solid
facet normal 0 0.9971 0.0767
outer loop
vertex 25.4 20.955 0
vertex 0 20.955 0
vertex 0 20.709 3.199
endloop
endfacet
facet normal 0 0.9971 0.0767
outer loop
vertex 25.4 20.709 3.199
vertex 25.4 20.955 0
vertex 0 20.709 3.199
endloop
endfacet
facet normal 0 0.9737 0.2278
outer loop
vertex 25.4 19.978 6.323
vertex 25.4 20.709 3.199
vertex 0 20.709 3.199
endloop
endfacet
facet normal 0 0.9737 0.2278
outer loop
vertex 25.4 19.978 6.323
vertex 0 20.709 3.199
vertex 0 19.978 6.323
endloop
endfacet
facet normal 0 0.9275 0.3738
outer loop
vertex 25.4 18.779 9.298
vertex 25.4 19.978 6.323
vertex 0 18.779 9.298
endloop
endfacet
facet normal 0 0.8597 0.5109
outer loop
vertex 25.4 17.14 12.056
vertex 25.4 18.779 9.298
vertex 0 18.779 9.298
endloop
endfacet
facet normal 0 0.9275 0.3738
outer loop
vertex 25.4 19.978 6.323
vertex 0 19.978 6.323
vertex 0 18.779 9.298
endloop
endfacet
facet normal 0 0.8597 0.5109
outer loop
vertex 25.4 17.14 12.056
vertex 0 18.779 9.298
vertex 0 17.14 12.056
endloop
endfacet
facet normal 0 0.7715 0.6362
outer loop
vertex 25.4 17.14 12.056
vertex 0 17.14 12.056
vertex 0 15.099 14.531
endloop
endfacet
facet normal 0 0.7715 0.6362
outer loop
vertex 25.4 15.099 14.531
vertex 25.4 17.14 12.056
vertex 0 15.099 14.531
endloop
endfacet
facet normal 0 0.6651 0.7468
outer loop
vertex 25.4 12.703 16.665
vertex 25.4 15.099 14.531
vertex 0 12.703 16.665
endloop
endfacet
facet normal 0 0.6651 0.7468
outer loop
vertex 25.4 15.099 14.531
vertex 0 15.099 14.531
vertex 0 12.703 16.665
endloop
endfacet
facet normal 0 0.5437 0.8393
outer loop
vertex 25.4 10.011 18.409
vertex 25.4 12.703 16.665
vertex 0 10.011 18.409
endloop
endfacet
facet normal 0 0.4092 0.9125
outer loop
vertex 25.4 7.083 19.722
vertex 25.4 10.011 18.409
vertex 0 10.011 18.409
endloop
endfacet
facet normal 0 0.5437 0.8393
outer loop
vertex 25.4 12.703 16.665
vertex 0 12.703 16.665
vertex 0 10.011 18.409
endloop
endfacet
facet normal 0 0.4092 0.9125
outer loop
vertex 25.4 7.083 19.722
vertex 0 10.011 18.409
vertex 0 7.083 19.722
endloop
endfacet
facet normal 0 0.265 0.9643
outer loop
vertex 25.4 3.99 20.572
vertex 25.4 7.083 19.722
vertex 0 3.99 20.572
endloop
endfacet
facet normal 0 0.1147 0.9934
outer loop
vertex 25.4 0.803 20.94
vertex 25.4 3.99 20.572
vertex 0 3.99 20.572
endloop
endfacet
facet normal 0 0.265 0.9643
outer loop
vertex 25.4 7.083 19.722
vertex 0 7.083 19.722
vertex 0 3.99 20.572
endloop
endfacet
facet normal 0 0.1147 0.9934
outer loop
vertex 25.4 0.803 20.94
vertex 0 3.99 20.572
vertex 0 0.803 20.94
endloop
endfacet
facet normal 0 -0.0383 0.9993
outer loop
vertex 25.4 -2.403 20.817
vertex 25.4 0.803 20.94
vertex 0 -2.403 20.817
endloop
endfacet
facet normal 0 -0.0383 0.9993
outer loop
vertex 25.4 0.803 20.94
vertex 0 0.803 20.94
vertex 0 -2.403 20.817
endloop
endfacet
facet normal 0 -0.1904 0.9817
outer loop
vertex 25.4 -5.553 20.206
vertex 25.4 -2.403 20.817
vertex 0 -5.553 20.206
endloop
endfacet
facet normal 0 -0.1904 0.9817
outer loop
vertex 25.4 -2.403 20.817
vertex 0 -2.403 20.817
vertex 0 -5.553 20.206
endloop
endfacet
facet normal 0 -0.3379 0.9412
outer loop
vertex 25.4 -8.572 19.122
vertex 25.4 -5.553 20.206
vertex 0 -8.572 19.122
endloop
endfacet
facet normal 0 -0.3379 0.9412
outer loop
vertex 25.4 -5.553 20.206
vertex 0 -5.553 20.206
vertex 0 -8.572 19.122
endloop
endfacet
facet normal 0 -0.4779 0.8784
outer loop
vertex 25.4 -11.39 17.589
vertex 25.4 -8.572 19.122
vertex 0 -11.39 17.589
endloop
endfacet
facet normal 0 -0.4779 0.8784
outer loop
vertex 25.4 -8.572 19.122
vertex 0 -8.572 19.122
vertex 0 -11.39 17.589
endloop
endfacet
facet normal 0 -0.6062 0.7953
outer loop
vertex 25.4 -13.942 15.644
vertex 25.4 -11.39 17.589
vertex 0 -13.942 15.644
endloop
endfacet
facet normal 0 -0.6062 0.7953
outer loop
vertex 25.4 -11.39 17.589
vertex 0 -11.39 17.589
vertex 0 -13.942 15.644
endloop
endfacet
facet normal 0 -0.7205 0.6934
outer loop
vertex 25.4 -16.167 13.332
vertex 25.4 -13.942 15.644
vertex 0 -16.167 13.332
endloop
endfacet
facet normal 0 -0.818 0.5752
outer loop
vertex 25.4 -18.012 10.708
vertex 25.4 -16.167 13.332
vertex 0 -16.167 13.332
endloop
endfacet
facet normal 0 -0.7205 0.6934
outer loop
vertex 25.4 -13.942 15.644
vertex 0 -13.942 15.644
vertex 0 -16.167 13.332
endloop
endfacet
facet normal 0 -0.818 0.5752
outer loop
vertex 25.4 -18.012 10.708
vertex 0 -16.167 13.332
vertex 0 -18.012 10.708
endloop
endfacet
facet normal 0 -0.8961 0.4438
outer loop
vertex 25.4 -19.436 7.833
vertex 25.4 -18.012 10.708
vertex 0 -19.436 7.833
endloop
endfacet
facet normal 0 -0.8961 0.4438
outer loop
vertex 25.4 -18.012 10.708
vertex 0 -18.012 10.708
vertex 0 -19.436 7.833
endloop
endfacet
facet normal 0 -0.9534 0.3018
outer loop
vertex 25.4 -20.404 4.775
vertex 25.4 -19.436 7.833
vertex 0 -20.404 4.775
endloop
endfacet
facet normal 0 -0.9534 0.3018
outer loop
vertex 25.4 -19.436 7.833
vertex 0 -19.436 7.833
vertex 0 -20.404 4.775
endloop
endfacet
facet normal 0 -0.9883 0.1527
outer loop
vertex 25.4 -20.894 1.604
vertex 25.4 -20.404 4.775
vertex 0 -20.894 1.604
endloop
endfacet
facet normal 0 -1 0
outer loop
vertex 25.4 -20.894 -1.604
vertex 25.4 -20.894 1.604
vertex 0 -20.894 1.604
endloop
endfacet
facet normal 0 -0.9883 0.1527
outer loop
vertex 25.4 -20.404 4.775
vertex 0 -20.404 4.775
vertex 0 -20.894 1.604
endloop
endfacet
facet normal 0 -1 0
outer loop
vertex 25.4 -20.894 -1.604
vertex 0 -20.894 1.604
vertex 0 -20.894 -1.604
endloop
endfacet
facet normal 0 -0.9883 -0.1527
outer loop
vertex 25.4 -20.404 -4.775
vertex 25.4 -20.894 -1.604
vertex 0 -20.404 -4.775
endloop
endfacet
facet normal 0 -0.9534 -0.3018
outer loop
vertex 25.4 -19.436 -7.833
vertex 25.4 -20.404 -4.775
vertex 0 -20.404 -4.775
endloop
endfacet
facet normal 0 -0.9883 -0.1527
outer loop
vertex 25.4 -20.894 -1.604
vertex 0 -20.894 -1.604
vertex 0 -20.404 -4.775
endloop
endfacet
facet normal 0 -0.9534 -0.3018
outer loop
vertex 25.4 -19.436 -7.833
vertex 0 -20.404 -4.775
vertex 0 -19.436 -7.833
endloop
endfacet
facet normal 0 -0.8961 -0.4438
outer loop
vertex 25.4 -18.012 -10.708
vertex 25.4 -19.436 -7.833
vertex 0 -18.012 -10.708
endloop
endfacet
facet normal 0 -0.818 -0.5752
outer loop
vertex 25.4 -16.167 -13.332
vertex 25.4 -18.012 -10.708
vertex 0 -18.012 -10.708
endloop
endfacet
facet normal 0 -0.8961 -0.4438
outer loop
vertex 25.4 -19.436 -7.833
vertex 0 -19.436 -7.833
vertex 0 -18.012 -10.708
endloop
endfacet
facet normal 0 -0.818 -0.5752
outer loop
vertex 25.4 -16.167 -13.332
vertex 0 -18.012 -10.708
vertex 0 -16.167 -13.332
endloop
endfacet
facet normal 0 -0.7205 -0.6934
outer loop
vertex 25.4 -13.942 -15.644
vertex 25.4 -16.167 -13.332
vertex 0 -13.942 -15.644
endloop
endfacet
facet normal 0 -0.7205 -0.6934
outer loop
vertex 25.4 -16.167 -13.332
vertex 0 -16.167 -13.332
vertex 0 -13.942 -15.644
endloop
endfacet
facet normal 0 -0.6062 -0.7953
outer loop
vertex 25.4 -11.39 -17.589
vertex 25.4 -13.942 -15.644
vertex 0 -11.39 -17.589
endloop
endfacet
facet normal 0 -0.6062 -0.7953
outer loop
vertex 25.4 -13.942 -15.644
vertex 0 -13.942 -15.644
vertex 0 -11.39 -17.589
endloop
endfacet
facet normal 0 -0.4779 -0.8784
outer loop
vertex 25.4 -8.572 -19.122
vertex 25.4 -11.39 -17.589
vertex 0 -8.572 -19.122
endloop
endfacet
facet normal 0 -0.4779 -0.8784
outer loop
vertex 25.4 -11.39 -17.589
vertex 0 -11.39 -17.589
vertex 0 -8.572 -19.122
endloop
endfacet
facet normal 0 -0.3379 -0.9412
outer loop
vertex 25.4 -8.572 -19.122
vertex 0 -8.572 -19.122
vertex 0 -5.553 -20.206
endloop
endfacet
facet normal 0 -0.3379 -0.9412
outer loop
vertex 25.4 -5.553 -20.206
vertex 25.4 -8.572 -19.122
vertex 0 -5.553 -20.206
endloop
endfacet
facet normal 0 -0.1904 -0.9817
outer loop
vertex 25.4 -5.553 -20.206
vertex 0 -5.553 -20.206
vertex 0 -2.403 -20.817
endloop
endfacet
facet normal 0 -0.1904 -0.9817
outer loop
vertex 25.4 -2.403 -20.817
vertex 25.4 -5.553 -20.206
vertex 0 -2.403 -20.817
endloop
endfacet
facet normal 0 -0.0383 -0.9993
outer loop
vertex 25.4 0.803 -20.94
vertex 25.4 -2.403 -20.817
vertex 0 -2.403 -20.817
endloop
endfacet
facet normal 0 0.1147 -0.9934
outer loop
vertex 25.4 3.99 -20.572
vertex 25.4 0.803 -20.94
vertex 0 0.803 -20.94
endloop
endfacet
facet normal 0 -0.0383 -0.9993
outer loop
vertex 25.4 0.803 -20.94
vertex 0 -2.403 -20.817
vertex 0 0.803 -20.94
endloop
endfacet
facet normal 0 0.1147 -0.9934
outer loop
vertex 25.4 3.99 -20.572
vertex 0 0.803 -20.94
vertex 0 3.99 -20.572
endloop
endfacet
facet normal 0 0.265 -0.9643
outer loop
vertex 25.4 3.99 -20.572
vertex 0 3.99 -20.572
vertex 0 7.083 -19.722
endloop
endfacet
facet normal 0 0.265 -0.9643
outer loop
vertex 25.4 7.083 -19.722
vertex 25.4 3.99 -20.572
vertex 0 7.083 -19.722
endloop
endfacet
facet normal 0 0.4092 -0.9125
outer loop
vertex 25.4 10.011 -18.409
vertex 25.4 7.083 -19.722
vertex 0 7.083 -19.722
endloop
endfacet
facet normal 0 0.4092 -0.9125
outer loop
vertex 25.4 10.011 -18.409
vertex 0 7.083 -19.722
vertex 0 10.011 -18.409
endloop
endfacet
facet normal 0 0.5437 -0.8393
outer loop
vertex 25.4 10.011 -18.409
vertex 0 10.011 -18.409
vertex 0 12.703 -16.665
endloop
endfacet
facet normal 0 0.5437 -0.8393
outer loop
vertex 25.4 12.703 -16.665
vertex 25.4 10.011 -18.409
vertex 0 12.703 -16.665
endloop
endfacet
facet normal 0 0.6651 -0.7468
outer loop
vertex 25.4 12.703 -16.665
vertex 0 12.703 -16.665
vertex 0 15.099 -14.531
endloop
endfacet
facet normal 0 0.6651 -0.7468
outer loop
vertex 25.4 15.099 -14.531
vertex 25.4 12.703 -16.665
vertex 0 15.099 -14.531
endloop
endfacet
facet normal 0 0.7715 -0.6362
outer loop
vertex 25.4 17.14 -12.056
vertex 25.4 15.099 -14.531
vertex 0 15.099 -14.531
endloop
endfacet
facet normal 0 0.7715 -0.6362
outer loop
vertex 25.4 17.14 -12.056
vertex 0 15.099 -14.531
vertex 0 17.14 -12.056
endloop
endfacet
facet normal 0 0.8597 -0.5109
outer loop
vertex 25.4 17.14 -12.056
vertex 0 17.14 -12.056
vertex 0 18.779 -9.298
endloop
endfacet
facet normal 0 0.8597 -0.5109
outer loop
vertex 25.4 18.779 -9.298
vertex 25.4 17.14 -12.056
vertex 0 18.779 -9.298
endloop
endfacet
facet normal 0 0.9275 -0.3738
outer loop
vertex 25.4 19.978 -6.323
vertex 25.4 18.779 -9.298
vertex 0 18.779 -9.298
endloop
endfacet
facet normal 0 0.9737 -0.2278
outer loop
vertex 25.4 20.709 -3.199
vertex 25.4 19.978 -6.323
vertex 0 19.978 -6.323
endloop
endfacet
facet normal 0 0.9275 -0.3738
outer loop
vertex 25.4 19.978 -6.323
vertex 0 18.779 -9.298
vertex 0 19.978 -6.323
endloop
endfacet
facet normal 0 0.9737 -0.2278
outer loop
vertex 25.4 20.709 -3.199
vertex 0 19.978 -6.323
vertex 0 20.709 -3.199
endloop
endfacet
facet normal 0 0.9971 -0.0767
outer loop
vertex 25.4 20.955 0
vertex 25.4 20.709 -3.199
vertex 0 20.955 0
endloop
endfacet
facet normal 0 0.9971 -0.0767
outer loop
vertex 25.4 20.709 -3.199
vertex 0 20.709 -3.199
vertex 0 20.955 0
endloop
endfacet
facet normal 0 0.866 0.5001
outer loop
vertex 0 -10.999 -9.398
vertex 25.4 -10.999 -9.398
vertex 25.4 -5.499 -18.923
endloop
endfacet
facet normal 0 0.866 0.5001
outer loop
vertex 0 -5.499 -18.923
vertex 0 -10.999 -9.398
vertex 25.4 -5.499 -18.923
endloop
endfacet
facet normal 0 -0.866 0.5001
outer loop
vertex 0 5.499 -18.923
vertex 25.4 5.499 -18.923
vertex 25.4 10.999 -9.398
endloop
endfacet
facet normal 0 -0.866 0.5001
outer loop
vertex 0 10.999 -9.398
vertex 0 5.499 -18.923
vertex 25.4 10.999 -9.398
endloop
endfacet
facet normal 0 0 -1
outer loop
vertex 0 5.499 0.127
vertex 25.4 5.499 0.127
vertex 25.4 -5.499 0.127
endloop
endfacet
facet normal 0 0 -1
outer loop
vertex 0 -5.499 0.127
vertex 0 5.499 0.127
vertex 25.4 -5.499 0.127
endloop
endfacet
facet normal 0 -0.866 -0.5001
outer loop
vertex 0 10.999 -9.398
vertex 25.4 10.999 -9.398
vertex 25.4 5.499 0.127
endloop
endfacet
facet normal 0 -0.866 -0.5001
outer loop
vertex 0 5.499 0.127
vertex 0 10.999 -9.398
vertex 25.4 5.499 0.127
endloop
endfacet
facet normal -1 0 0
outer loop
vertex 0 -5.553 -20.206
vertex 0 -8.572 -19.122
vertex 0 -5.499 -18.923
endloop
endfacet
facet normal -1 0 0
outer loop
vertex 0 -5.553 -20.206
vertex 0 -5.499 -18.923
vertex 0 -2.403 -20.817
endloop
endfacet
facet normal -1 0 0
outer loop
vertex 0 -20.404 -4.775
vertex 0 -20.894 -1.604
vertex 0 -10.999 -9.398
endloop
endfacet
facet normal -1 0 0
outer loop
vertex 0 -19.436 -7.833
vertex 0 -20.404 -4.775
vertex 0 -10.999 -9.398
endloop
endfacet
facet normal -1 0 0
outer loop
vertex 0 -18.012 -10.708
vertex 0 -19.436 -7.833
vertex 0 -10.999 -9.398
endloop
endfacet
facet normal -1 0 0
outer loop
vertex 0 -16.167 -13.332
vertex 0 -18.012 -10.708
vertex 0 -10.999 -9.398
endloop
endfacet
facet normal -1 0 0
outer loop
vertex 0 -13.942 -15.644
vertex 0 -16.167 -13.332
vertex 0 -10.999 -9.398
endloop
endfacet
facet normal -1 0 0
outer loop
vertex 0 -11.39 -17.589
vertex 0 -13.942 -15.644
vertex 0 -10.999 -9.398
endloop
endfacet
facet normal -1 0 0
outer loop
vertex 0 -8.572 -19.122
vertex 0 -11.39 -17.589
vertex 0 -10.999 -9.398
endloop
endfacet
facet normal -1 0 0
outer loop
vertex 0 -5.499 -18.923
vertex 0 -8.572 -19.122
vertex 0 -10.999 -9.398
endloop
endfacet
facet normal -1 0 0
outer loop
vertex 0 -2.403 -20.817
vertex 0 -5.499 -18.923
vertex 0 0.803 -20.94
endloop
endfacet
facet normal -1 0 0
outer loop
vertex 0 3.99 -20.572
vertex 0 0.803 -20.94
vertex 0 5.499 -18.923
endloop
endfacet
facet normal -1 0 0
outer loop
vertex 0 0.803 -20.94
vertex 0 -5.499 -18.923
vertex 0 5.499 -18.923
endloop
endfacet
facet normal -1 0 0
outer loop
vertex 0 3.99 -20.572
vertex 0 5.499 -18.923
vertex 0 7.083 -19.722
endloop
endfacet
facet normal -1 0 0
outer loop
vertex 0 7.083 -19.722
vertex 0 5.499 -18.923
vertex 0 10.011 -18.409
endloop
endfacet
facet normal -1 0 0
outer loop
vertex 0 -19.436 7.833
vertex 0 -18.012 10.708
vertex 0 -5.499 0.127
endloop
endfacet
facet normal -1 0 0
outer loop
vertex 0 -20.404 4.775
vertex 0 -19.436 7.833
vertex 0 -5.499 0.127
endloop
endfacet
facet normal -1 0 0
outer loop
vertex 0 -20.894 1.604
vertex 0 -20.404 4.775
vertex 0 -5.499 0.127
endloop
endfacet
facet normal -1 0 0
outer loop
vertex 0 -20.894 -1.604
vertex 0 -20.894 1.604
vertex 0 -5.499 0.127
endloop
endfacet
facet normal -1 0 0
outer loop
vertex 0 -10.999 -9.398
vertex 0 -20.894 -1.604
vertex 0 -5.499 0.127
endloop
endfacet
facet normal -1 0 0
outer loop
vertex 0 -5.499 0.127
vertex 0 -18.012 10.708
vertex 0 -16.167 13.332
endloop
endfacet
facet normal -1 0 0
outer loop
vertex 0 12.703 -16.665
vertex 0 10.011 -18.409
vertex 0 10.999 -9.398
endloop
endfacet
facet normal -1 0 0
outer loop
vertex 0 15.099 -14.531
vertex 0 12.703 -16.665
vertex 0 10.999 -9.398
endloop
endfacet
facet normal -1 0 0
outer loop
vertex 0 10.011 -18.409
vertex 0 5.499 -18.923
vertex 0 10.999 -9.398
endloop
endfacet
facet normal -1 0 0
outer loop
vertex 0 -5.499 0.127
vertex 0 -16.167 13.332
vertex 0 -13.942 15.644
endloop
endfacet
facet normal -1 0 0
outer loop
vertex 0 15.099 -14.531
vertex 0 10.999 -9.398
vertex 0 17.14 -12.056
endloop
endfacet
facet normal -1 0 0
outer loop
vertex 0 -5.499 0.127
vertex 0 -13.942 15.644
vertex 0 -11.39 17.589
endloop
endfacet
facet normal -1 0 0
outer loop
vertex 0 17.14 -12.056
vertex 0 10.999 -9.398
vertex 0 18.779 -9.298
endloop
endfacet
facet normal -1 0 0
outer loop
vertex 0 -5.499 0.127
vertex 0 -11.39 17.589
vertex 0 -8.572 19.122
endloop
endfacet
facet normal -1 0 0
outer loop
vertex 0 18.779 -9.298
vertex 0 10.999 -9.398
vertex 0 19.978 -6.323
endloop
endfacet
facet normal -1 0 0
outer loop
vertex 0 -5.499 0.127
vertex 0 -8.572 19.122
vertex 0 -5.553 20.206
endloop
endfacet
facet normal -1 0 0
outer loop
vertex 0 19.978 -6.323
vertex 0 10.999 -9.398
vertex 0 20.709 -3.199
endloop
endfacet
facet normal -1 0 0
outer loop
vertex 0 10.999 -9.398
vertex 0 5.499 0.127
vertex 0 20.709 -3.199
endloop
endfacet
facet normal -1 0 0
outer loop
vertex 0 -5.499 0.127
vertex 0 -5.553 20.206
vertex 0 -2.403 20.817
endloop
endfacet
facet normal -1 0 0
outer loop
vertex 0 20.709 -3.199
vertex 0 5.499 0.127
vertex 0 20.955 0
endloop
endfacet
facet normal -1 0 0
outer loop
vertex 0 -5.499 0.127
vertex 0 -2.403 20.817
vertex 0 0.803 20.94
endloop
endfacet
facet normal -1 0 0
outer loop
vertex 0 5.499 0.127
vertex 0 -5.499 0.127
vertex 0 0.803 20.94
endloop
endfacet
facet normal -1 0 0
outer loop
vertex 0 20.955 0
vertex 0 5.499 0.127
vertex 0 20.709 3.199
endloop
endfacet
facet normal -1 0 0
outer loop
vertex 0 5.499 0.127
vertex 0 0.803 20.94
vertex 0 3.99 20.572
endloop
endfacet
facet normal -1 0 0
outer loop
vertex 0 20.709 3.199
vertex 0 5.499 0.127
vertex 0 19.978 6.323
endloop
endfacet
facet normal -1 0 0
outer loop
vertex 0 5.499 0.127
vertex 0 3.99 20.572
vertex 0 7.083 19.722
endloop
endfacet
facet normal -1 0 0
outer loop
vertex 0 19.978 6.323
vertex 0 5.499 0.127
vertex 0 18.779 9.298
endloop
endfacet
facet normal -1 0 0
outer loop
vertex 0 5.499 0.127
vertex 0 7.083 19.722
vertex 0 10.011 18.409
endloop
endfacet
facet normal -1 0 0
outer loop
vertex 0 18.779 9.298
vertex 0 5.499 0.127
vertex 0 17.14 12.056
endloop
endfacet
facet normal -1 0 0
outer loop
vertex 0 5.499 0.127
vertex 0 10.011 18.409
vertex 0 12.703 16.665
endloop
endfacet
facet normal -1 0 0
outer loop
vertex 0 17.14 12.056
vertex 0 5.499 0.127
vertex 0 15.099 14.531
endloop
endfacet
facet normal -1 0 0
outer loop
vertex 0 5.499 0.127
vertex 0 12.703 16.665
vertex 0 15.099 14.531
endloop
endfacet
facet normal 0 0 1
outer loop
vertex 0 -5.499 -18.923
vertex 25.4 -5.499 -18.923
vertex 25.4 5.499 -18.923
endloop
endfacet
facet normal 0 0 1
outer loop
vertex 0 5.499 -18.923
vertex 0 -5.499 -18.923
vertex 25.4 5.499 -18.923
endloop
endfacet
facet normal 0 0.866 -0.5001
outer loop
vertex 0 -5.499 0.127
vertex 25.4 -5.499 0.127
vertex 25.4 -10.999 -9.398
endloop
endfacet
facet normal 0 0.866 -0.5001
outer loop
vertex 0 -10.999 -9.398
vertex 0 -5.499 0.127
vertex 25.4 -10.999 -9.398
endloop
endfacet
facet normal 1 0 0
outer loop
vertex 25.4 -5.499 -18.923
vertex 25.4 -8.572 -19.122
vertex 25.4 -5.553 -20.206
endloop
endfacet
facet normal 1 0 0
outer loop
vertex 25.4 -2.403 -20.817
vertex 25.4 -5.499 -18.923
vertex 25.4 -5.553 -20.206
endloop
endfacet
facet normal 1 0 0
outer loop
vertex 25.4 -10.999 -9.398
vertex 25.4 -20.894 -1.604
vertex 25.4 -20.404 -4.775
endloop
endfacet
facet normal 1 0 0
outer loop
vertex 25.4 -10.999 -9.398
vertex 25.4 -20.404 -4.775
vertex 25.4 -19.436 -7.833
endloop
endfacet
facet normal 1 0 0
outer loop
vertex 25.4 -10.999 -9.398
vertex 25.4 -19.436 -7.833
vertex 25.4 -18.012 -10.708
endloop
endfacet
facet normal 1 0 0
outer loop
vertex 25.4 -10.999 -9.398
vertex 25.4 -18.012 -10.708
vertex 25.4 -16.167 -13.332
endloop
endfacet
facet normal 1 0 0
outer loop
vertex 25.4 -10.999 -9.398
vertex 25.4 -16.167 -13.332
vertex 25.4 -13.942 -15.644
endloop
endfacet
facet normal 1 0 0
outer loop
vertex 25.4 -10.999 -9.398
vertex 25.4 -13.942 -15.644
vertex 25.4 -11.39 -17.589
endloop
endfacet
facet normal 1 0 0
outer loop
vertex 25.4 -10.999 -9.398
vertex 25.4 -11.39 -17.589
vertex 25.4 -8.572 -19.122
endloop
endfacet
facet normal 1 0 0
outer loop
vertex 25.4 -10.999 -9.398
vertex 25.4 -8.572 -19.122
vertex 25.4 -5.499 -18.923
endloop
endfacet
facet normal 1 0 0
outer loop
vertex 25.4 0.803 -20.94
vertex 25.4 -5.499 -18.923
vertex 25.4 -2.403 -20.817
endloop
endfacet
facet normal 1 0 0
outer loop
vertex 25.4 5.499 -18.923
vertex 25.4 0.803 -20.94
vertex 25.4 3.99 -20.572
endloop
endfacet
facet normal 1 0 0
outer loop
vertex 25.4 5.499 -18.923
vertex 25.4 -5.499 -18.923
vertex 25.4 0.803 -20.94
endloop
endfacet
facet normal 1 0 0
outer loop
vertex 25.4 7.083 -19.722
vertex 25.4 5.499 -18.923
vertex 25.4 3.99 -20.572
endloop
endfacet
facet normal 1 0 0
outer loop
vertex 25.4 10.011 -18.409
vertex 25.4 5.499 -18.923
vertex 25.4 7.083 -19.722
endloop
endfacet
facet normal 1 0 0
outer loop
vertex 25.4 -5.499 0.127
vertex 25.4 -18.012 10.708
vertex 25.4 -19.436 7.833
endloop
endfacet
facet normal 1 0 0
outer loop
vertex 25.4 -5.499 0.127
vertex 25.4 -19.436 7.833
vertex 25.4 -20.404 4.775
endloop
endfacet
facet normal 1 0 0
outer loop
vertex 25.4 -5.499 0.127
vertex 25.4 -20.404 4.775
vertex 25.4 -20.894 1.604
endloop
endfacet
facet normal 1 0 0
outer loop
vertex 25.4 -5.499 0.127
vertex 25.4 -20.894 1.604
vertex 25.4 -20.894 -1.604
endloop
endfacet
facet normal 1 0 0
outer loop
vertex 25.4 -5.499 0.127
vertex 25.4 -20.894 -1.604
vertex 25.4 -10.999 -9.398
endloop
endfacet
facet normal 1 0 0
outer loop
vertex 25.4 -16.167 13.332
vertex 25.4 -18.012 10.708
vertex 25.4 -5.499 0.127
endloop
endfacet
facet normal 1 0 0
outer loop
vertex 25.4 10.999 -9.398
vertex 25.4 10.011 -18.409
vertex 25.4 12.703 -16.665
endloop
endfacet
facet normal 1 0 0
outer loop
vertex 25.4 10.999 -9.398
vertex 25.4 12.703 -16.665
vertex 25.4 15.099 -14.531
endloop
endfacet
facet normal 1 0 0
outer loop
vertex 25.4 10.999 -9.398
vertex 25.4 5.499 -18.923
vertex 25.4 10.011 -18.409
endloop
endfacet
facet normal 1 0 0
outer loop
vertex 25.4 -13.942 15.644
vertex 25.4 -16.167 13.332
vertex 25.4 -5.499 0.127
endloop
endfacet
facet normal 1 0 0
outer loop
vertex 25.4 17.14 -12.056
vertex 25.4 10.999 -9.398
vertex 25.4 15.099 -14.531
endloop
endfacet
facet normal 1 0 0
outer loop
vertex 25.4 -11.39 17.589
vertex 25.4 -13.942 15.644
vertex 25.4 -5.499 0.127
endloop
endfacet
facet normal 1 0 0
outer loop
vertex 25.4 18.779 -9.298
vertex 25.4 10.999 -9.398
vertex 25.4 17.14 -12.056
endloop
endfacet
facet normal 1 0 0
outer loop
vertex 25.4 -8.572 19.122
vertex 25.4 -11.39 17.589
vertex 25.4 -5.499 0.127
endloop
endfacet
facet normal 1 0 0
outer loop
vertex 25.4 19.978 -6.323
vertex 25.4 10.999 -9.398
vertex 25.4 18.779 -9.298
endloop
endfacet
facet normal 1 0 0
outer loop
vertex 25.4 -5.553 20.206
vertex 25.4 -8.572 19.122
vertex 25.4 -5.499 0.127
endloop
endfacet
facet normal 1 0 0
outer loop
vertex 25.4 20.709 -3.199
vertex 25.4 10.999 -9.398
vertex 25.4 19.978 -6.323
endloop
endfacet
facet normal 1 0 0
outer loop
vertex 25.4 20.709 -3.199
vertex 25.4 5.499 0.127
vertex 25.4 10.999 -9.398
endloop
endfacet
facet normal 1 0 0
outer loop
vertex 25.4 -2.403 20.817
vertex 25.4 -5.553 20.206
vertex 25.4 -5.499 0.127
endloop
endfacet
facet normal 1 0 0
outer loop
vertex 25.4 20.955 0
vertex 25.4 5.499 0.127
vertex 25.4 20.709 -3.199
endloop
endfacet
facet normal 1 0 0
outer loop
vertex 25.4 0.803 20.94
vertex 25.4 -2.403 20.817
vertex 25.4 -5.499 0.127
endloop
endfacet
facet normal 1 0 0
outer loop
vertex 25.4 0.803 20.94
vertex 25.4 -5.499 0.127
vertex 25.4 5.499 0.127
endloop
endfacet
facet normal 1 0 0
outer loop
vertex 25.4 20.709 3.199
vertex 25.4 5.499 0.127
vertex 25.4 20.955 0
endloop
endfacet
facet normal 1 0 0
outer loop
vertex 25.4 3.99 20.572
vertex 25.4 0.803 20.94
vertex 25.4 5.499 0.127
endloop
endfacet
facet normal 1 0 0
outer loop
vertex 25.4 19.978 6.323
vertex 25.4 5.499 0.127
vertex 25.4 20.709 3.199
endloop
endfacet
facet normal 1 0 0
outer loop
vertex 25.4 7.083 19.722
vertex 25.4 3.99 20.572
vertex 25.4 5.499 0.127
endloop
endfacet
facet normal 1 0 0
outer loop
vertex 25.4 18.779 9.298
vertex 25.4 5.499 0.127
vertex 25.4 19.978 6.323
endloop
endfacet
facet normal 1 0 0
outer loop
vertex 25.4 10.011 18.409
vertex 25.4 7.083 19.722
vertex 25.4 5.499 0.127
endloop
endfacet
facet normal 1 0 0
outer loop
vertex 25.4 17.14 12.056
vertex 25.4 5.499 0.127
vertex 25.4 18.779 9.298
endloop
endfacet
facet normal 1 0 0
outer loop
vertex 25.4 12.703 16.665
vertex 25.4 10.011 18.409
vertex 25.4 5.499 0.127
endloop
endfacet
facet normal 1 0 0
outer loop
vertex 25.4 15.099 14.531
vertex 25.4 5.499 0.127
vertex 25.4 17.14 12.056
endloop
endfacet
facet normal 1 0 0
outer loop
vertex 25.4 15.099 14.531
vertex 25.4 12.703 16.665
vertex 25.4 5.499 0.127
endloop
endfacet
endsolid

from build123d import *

# Parameters (mm, degrees)
F0_R     = 20.955
F1_DEPTH = 25.4
F3_DEPTH = 25.4


with BuildPart() as f1:
    # F0 (on Right) → F1 (new body)
    with BuildSketch(Plane.YZ):
        Circle(F0_R)
    extrude(amount=F1_DEPTH)

    # F2 (on face) → F3 (cut)
    with BuildSketch(Plane.YZ.offset(25.4)):
        Polygon((0, -18.923), (5.499261, -18.923), (10.998523, -9.398), (5.499261, 0.127), (-5.499261, 0.127), (-10.998523, -9.398), (-5.499261, -18.923), align=None)
    extrude(amount=-F3_DEPTH, mode=Mode.SUBTRACT)


solid = f1.part
